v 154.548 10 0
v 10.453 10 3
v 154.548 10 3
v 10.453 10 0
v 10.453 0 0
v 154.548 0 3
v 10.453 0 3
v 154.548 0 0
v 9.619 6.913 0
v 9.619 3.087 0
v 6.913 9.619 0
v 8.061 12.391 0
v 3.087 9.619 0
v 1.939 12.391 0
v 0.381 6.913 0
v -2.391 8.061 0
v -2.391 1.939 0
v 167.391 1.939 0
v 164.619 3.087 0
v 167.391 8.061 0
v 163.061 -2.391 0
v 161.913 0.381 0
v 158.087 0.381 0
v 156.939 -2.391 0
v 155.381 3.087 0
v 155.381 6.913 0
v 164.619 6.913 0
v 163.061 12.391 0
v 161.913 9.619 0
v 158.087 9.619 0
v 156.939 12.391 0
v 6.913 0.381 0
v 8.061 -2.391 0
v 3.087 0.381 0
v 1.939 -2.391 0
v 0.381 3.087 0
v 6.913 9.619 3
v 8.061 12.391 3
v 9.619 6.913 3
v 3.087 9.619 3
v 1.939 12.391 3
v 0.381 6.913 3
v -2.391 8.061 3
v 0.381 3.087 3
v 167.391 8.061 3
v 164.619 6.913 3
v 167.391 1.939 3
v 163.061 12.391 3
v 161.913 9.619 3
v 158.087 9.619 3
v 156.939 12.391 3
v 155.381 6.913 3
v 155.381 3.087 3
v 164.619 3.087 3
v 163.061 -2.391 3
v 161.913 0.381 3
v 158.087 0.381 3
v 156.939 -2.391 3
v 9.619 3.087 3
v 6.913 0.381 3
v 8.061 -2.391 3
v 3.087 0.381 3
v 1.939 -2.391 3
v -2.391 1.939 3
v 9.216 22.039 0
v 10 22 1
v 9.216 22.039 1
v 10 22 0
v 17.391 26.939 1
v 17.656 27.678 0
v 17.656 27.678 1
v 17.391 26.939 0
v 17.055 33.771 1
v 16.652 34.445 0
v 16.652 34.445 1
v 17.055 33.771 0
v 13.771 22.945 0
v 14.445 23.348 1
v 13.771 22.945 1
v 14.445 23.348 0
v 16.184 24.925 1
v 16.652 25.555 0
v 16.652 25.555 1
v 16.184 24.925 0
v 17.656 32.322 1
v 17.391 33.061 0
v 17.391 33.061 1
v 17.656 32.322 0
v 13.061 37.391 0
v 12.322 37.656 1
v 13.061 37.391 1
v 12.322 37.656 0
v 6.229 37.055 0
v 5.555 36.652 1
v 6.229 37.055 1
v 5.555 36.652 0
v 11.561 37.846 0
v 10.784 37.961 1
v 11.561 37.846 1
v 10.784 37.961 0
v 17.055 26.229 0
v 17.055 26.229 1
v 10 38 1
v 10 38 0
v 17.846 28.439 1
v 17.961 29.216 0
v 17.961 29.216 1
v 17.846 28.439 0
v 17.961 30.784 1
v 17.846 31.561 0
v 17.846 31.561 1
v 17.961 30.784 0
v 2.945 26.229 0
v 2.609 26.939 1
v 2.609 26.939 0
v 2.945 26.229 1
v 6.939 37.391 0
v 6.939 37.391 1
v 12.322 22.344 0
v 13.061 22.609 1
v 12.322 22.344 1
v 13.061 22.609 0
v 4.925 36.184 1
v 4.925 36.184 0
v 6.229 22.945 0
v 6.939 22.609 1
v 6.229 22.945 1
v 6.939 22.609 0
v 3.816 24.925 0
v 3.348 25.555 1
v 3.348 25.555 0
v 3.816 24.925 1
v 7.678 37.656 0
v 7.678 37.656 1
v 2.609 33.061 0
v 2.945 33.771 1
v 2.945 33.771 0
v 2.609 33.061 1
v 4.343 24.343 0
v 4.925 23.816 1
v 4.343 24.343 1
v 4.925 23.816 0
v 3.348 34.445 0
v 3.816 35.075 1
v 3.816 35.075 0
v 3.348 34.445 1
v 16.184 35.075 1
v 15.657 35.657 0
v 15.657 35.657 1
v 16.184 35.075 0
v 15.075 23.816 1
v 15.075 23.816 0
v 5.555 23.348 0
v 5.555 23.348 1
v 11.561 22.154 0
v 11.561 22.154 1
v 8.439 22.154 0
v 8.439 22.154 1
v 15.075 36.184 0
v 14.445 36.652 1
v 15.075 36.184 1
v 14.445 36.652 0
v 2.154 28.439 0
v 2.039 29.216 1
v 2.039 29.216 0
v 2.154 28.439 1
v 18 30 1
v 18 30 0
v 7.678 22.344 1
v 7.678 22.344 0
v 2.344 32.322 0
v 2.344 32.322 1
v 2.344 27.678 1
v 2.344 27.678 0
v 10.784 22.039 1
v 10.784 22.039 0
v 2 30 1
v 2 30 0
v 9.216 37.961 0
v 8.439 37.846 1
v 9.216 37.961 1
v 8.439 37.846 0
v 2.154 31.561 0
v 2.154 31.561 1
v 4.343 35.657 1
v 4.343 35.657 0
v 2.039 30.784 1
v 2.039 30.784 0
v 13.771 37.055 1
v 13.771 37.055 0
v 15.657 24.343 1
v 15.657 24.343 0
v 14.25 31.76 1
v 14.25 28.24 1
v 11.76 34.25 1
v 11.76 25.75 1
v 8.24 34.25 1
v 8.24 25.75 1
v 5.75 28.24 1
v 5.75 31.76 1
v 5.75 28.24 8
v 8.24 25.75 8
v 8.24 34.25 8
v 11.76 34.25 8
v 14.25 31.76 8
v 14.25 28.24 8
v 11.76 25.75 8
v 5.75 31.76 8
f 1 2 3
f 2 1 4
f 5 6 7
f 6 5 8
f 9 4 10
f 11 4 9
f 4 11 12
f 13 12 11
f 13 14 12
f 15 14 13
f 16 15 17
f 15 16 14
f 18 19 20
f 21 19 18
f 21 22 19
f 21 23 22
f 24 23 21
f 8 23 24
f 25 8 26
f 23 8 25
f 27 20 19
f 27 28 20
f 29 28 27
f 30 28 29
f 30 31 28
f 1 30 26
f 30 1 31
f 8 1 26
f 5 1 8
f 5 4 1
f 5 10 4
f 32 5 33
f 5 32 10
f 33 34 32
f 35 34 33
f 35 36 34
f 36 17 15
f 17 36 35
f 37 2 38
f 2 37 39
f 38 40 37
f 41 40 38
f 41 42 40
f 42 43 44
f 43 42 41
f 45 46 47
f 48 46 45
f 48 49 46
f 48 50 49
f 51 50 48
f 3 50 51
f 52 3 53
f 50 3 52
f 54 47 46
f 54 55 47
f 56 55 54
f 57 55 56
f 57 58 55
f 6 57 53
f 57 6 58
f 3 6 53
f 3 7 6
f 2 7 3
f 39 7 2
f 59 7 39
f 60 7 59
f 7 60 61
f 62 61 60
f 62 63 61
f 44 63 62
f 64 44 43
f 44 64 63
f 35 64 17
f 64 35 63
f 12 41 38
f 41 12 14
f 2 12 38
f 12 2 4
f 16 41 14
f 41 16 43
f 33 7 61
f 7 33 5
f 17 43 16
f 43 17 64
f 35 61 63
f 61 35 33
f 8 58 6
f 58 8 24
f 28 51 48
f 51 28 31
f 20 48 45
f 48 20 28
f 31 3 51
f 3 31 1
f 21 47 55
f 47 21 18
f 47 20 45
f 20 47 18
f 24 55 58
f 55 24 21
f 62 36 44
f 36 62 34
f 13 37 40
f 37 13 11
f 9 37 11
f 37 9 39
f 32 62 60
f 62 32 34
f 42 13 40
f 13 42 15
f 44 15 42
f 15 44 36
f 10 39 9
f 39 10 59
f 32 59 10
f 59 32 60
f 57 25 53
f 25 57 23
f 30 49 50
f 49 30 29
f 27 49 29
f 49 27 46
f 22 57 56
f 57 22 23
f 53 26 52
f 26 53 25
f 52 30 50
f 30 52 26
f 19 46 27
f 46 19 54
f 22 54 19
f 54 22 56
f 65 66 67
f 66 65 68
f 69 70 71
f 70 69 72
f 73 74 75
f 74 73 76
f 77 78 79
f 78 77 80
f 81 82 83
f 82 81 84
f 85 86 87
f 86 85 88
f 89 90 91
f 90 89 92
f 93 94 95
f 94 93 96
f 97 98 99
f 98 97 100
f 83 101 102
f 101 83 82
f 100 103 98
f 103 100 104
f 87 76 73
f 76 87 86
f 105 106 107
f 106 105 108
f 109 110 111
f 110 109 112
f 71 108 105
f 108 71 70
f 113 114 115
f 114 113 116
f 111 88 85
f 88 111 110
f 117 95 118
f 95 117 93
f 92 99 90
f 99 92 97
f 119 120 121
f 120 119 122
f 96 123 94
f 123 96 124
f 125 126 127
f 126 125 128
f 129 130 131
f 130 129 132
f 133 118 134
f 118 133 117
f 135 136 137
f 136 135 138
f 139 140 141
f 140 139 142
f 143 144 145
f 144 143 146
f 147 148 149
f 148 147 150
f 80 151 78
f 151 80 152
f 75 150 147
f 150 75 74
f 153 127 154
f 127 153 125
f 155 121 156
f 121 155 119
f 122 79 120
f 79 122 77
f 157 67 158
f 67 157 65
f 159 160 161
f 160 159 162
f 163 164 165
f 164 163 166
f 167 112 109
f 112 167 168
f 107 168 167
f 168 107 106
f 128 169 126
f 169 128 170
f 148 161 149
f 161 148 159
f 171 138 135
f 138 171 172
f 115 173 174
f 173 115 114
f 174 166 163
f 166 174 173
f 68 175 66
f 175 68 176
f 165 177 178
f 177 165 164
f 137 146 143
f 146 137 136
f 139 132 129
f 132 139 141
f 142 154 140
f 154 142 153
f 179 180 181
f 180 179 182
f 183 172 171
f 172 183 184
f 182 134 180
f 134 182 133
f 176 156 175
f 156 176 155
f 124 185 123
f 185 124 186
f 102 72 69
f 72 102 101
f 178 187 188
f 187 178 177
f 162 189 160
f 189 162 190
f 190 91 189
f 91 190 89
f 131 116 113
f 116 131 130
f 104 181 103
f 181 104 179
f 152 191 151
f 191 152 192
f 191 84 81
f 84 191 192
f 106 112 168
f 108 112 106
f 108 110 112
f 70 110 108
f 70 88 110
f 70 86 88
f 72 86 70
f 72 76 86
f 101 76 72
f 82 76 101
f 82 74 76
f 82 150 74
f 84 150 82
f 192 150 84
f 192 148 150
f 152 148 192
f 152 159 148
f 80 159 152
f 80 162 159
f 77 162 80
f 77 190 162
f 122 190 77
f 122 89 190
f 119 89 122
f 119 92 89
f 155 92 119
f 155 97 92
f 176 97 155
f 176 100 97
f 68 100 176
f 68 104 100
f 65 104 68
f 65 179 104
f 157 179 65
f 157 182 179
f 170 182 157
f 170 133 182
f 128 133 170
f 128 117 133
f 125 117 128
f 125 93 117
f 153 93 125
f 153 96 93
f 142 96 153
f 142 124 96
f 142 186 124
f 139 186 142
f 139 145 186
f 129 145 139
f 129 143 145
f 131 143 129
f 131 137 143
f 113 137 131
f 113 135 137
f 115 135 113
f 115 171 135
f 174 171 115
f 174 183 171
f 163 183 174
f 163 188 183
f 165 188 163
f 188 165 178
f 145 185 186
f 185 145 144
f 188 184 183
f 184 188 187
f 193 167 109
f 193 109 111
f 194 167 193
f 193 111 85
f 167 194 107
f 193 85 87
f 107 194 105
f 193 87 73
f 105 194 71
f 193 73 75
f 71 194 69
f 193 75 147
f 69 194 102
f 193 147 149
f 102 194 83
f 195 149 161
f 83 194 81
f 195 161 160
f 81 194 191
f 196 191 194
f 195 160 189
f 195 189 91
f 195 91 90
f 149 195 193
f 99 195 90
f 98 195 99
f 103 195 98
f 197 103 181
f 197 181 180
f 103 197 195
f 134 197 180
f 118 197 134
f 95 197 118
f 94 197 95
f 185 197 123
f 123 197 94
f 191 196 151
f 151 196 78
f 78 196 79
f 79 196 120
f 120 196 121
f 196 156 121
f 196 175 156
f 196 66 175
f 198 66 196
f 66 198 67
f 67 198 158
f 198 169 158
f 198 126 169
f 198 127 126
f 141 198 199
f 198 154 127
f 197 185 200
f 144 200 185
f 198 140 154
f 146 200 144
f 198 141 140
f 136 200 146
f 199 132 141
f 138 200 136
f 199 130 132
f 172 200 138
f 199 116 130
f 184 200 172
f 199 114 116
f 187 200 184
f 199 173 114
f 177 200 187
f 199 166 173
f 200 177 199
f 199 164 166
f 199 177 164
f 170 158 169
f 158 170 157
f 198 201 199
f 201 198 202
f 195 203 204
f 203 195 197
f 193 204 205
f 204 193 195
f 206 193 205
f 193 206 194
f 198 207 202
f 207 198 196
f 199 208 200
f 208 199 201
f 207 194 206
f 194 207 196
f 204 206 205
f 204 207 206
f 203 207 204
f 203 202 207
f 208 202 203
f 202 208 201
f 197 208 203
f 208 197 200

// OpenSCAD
$fn = 64;

connector_out = 8;
connector_in = 5;
thickness = 3;
width = 10;
length = 165;

module bar() {
  module rounded_cube(v) {
    hull() {
      translate([v[1] / 2, v[1] / 2, 0]) {
        cylinder(h = v[2], r = v[1] / 2);
      }
      translate([v[0] - v[1] / 2, v[1] / 2, 0]) {
        cylinder(h = v[2], r = v[1] / 2);
      }
    }
  }

  difference() {
    union() {
      rounded_cube([length, width, thickness]);
      translate([width / 2, width / 2, 0]) {
        rotate(22.5, [0, 0, 1]) {
          cylinder(center = false, h = thickness, r = connector_out, $fn = 8);
        }
      }
      translate([length - width / 2, width / 2, 0]) {
        rotate(22.5, [0, 0, 1]) {
          cylinder(center = false, h = thickness, r = connector_out, $fn = 8);
        }
      }
    }
    translate([width / 2, width / 2, 0]) {
      rotate(22.5, [0, 0, 1]) {
        cylinder(center = false, h = thickness + 1, r = connector_in, $fn = 8);
      }
    }
    translate([length - width / 2, width / 2, 0]) {
      rotate(22.5, [0, 0, 1]) {
        cylinder(center = false, h = thickness + 1, r = connector_in, $fn = 8);
      }
    }
  }
}

module connector() {
  tolerance = 0.4;
  rotate(22.5, [0, 0, 1]) {
    cylinder(center = false, h = 1, r = connector_out, $fn = 64);
    cylinder(center = false, h = 2 * (thickness + 1), r = connector_in - tolerance, $fn = 8);
  }
}

bar();

translate([10, 30, 0]) {
  connector();
}
